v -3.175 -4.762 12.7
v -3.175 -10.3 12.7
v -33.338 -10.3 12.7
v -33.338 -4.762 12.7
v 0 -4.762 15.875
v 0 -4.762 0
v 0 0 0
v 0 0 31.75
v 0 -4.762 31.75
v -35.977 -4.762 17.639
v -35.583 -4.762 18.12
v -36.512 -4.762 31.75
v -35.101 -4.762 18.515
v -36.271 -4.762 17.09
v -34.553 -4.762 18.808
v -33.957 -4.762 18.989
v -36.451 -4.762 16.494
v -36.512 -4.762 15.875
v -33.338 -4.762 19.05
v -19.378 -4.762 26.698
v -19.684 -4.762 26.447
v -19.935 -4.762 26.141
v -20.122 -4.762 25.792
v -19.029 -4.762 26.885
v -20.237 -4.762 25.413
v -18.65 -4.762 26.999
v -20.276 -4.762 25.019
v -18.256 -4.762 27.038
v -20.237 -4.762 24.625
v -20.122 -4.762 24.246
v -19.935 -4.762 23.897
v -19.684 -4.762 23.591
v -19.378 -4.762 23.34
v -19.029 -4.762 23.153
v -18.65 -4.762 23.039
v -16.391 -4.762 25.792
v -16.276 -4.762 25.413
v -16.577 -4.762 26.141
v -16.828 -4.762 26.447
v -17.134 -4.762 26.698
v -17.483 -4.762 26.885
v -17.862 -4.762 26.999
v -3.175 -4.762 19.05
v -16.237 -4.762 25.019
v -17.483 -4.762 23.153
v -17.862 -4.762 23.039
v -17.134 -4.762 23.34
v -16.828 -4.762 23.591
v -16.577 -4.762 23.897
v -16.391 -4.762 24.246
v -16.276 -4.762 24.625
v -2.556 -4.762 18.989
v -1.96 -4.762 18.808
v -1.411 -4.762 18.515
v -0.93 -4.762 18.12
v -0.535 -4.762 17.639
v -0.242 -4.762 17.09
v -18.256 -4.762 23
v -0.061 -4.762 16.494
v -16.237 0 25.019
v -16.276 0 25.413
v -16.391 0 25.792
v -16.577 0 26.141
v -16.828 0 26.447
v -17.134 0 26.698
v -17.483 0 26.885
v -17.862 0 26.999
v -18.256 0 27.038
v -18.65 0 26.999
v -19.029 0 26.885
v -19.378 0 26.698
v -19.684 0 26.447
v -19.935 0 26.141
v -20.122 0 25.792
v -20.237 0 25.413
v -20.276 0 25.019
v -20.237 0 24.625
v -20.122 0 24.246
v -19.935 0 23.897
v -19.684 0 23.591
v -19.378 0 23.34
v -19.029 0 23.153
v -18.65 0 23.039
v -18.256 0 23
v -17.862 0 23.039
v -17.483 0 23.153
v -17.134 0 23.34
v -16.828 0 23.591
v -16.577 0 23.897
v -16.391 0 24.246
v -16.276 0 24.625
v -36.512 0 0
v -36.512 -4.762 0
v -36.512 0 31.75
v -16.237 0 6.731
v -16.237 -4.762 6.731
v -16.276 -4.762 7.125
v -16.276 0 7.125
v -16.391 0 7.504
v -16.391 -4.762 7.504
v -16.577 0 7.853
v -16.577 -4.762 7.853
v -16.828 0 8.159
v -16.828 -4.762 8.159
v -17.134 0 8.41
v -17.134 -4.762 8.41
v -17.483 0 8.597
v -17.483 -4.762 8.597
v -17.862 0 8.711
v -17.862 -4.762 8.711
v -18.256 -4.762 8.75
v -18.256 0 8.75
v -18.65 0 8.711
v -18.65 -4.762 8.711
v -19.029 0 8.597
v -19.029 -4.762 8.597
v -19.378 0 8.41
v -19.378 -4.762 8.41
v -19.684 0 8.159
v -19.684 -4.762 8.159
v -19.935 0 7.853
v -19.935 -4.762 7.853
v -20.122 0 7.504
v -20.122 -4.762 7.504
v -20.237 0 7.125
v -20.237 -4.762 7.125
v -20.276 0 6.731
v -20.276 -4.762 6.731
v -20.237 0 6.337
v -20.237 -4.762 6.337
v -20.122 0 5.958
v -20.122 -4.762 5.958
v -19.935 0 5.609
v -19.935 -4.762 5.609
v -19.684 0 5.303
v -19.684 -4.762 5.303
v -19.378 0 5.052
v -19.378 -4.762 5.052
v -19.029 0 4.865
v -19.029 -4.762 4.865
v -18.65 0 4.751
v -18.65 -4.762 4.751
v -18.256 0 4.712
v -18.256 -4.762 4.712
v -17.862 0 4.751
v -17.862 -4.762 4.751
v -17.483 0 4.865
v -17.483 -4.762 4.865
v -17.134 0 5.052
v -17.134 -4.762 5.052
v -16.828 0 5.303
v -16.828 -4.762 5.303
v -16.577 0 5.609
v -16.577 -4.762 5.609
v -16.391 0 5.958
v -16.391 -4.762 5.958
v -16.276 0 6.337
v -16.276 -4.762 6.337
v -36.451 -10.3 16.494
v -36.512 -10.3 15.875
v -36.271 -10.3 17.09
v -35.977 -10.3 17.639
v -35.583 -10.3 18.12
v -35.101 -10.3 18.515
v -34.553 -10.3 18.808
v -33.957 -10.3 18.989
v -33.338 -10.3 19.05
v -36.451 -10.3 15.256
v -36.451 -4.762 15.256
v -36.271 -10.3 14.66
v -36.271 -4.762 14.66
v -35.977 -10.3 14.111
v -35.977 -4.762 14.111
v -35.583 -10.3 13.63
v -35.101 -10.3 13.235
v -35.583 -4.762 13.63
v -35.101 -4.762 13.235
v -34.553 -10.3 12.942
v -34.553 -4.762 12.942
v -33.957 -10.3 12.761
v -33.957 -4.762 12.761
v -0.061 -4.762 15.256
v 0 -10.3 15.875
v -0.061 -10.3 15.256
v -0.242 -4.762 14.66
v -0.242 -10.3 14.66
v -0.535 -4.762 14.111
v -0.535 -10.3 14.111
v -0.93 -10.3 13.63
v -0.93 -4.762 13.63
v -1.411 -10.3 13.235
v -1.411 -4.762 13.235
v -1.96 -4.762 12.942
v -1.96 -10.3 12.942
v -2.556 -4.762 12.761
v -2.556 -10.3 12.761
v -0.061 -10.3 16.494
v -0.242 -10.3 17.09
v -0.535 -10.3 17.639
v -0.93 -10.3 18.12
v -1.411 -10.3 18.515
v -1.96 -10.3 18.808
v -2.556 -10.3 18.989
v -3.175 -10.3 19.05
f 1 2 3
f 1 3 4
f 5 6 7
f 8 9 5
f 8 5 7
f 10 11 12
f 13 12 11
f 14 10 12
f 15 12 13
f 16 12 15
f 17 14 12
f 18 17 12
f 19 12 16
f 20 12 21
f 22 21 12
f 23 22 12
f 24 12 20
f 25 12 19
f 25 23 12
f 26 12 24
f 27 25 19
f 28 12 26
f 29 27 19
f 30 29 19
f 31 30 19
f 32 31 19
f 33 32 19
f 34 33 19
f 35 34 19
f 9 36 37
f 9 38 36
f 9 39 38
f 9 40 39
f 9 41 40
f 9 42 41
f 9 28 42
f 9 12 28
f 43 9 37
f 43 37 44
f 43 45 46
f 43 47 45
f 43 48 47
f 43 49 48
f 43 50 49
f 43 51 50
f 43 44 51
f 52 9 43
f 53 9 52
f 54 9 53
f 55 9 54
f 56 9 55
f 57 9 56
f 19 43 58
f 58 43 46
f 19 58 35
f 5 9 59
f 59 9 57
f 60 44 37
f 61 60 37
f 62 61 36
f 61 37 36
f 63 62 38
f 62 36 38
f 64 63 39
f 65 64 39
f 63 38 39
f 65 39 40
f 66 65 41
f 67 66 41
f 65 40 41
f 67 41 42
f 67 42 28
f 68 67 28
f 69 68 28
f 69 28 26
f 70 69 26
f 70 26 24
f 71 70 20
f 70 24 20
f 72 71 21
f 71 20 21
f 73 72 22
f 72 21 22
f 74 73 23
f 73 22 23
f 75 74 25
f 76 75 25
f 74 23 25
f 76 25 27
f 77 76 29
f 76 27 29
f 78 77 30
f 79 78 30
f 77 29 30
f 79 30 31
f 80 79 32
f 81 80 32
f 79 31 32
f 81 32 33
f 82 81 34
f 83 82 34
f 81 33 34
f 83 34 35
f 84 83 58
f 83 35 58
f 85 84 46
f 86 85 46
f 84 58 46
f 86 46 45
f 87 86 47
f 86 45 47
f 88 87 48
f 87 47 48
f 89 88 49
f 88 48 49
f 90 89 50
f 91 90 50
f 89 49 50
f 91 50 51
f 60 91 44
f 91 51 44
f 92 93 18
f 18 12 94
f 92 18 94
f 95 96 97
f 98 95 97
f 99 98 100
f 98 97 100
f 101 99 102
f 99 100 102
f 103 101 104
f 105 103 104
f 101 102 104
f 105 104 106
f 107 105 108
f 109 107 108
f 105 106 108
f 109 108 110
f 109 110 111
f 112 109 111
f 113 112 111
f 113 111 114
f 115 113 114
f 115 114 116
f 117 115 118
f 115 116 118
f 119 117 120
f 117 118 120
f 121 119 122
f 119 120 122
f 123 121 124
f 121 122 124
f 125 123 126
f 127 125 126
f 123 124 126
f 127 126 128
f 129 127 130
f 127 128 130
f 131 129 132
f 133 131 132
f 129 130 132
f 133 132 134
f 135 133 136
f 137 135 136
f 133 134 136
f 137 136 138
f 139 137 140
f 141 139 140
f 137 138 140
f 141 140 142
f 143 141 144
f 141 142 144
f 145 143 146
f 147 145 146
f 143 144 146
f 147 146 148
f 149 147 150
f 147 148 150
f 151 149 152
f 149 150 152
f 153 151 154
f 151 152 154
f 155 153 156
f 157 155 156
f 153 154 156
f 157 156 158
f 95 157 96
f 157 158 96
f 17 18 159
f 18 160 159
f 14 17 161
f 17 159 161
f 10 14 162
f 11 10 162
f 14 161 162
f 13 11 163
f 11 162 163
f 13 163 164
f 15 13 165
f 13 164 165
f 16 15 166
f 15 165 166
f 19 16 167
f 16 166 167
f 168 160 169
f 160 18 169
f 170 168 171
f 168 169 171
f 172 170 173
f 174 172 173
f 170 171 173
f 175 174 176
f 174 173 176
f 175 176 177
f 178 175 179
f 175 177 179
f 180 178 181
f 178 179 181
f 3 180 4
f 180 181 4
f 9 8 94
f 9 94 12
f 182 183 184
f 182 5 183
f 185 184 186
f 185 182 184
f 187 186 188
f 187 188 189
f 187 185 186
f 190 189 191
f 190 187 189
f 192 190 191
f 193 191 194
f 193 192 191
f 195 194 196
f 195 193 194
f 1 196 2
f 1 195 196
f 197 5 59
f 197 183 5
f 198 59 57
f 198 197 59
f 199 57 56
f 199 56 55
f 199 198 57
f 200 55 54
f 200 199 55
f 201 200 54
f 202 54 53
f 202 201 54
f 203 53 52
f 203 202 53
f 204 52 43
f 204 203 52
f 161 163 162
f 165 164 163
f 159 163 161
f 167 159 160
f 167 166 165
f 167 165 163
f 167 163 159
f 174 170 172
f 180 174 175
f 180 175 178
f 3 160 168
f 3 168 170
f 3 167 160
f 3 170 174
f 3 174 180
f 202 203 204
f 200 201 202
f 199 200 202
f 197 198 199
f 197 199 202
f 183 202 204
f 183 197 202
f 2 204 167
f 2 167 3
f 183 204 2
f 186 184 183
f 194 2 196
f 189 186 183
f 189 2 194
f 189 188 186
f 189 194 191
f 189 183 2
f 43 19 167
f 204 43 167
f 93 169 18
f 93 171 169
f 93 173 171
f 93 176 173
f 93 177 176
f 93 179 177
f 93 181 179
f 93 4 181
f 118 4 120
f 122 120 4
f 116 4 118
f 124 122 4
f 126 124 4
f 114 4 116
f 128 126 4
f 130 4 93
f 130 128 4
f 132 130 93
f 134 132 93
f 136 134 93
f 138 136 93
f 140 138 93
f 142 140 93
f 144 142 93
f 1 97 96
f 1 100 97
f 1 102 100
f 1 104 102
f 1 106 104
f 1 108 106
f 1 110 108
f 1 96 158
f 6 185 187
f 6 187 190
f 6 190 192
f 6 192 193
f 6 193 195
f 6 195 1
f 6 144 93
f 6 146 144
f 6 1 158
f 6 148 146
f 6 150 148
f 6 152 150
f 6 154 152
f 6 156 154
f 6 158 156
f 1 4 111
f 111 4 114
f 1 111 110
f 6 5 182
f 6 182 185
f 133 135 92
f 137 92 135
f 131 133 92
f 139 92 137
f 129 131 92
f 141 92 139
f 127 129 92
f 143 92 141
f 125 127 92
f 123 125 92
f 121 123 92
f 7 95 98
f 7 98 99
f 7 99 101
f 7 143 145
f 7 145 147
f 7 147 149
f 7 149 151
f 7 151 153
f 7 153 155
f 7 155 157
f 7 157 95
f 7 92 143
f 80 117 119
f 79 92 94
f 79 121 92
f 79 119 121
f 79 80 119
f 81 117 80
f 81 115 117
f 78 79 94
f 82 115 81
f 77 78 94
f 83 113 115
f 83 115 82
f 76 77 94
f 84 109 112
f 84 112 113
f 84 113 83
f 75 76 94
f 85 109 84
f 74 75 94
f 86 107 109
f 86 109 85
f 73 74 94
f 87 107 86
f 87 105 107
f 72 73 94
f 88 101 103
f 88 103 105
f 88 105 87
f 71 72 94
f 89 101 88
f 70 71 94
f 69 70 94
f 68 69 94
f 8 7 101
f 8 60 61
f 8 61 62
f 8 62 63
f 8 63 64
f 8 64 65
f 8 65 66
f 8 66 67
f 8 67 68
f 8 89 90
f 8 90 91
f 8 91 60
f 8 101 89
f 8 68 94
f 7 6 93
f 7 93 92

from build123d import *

# Parameters (mm, degrees)
F1_DEPTH = 36.5125
F2_R     = 2.0193
F3_DEPTH = 4.7625
F4_R     = 3.17499


# Not quite as in the source:
# - a fillet or chamfer is up to 0.001 mm smaller than in the source, because OpenCascade refuses the exact size


with BuildPart() as f1:
    # F0 (on Right) → F1 (new body)
    with BuildSketch(Plane.YZ):
        Polygon((-4.7625, 0), (0, 0), (0, 31.75), (-4.7625, 31.75), (-4.7625, 19.05), (-10.2997, 19.05), (-10.2997, 12.7), (-4.7625, 12.7), align=None)
    extrude(amount=-F1_DEPTH)

    # F2 (on face) → F3 (cut, through all)
    with BuildSketch(Plane.XZ.offset(4.7625)):
        with Locations((-18.25625, 25.019)):
            Circle(F2_R)
        with Locations((-18.25625, 6.731)):
            Circle(F2_R)
    extrude(amount=-F3_DEPTH, mode=Mode.SUBTRACT)

    # F4 (radius 3.175 in the source; OpenCascade refuses exactly that, so slightly less here)
    f4_edges = [f1.edges().sort_by_distance(p)[0] for p in [
        (0, -7.5311, 19.05),
        (0, -7.5311, 12.7),
        (-36.5125, -7.5311, 12.7),
        (-36.5125, -7.5311, 19.05),
    ]]
    fillet(f4_edges, radius=F4_R)


solid = f1.part
